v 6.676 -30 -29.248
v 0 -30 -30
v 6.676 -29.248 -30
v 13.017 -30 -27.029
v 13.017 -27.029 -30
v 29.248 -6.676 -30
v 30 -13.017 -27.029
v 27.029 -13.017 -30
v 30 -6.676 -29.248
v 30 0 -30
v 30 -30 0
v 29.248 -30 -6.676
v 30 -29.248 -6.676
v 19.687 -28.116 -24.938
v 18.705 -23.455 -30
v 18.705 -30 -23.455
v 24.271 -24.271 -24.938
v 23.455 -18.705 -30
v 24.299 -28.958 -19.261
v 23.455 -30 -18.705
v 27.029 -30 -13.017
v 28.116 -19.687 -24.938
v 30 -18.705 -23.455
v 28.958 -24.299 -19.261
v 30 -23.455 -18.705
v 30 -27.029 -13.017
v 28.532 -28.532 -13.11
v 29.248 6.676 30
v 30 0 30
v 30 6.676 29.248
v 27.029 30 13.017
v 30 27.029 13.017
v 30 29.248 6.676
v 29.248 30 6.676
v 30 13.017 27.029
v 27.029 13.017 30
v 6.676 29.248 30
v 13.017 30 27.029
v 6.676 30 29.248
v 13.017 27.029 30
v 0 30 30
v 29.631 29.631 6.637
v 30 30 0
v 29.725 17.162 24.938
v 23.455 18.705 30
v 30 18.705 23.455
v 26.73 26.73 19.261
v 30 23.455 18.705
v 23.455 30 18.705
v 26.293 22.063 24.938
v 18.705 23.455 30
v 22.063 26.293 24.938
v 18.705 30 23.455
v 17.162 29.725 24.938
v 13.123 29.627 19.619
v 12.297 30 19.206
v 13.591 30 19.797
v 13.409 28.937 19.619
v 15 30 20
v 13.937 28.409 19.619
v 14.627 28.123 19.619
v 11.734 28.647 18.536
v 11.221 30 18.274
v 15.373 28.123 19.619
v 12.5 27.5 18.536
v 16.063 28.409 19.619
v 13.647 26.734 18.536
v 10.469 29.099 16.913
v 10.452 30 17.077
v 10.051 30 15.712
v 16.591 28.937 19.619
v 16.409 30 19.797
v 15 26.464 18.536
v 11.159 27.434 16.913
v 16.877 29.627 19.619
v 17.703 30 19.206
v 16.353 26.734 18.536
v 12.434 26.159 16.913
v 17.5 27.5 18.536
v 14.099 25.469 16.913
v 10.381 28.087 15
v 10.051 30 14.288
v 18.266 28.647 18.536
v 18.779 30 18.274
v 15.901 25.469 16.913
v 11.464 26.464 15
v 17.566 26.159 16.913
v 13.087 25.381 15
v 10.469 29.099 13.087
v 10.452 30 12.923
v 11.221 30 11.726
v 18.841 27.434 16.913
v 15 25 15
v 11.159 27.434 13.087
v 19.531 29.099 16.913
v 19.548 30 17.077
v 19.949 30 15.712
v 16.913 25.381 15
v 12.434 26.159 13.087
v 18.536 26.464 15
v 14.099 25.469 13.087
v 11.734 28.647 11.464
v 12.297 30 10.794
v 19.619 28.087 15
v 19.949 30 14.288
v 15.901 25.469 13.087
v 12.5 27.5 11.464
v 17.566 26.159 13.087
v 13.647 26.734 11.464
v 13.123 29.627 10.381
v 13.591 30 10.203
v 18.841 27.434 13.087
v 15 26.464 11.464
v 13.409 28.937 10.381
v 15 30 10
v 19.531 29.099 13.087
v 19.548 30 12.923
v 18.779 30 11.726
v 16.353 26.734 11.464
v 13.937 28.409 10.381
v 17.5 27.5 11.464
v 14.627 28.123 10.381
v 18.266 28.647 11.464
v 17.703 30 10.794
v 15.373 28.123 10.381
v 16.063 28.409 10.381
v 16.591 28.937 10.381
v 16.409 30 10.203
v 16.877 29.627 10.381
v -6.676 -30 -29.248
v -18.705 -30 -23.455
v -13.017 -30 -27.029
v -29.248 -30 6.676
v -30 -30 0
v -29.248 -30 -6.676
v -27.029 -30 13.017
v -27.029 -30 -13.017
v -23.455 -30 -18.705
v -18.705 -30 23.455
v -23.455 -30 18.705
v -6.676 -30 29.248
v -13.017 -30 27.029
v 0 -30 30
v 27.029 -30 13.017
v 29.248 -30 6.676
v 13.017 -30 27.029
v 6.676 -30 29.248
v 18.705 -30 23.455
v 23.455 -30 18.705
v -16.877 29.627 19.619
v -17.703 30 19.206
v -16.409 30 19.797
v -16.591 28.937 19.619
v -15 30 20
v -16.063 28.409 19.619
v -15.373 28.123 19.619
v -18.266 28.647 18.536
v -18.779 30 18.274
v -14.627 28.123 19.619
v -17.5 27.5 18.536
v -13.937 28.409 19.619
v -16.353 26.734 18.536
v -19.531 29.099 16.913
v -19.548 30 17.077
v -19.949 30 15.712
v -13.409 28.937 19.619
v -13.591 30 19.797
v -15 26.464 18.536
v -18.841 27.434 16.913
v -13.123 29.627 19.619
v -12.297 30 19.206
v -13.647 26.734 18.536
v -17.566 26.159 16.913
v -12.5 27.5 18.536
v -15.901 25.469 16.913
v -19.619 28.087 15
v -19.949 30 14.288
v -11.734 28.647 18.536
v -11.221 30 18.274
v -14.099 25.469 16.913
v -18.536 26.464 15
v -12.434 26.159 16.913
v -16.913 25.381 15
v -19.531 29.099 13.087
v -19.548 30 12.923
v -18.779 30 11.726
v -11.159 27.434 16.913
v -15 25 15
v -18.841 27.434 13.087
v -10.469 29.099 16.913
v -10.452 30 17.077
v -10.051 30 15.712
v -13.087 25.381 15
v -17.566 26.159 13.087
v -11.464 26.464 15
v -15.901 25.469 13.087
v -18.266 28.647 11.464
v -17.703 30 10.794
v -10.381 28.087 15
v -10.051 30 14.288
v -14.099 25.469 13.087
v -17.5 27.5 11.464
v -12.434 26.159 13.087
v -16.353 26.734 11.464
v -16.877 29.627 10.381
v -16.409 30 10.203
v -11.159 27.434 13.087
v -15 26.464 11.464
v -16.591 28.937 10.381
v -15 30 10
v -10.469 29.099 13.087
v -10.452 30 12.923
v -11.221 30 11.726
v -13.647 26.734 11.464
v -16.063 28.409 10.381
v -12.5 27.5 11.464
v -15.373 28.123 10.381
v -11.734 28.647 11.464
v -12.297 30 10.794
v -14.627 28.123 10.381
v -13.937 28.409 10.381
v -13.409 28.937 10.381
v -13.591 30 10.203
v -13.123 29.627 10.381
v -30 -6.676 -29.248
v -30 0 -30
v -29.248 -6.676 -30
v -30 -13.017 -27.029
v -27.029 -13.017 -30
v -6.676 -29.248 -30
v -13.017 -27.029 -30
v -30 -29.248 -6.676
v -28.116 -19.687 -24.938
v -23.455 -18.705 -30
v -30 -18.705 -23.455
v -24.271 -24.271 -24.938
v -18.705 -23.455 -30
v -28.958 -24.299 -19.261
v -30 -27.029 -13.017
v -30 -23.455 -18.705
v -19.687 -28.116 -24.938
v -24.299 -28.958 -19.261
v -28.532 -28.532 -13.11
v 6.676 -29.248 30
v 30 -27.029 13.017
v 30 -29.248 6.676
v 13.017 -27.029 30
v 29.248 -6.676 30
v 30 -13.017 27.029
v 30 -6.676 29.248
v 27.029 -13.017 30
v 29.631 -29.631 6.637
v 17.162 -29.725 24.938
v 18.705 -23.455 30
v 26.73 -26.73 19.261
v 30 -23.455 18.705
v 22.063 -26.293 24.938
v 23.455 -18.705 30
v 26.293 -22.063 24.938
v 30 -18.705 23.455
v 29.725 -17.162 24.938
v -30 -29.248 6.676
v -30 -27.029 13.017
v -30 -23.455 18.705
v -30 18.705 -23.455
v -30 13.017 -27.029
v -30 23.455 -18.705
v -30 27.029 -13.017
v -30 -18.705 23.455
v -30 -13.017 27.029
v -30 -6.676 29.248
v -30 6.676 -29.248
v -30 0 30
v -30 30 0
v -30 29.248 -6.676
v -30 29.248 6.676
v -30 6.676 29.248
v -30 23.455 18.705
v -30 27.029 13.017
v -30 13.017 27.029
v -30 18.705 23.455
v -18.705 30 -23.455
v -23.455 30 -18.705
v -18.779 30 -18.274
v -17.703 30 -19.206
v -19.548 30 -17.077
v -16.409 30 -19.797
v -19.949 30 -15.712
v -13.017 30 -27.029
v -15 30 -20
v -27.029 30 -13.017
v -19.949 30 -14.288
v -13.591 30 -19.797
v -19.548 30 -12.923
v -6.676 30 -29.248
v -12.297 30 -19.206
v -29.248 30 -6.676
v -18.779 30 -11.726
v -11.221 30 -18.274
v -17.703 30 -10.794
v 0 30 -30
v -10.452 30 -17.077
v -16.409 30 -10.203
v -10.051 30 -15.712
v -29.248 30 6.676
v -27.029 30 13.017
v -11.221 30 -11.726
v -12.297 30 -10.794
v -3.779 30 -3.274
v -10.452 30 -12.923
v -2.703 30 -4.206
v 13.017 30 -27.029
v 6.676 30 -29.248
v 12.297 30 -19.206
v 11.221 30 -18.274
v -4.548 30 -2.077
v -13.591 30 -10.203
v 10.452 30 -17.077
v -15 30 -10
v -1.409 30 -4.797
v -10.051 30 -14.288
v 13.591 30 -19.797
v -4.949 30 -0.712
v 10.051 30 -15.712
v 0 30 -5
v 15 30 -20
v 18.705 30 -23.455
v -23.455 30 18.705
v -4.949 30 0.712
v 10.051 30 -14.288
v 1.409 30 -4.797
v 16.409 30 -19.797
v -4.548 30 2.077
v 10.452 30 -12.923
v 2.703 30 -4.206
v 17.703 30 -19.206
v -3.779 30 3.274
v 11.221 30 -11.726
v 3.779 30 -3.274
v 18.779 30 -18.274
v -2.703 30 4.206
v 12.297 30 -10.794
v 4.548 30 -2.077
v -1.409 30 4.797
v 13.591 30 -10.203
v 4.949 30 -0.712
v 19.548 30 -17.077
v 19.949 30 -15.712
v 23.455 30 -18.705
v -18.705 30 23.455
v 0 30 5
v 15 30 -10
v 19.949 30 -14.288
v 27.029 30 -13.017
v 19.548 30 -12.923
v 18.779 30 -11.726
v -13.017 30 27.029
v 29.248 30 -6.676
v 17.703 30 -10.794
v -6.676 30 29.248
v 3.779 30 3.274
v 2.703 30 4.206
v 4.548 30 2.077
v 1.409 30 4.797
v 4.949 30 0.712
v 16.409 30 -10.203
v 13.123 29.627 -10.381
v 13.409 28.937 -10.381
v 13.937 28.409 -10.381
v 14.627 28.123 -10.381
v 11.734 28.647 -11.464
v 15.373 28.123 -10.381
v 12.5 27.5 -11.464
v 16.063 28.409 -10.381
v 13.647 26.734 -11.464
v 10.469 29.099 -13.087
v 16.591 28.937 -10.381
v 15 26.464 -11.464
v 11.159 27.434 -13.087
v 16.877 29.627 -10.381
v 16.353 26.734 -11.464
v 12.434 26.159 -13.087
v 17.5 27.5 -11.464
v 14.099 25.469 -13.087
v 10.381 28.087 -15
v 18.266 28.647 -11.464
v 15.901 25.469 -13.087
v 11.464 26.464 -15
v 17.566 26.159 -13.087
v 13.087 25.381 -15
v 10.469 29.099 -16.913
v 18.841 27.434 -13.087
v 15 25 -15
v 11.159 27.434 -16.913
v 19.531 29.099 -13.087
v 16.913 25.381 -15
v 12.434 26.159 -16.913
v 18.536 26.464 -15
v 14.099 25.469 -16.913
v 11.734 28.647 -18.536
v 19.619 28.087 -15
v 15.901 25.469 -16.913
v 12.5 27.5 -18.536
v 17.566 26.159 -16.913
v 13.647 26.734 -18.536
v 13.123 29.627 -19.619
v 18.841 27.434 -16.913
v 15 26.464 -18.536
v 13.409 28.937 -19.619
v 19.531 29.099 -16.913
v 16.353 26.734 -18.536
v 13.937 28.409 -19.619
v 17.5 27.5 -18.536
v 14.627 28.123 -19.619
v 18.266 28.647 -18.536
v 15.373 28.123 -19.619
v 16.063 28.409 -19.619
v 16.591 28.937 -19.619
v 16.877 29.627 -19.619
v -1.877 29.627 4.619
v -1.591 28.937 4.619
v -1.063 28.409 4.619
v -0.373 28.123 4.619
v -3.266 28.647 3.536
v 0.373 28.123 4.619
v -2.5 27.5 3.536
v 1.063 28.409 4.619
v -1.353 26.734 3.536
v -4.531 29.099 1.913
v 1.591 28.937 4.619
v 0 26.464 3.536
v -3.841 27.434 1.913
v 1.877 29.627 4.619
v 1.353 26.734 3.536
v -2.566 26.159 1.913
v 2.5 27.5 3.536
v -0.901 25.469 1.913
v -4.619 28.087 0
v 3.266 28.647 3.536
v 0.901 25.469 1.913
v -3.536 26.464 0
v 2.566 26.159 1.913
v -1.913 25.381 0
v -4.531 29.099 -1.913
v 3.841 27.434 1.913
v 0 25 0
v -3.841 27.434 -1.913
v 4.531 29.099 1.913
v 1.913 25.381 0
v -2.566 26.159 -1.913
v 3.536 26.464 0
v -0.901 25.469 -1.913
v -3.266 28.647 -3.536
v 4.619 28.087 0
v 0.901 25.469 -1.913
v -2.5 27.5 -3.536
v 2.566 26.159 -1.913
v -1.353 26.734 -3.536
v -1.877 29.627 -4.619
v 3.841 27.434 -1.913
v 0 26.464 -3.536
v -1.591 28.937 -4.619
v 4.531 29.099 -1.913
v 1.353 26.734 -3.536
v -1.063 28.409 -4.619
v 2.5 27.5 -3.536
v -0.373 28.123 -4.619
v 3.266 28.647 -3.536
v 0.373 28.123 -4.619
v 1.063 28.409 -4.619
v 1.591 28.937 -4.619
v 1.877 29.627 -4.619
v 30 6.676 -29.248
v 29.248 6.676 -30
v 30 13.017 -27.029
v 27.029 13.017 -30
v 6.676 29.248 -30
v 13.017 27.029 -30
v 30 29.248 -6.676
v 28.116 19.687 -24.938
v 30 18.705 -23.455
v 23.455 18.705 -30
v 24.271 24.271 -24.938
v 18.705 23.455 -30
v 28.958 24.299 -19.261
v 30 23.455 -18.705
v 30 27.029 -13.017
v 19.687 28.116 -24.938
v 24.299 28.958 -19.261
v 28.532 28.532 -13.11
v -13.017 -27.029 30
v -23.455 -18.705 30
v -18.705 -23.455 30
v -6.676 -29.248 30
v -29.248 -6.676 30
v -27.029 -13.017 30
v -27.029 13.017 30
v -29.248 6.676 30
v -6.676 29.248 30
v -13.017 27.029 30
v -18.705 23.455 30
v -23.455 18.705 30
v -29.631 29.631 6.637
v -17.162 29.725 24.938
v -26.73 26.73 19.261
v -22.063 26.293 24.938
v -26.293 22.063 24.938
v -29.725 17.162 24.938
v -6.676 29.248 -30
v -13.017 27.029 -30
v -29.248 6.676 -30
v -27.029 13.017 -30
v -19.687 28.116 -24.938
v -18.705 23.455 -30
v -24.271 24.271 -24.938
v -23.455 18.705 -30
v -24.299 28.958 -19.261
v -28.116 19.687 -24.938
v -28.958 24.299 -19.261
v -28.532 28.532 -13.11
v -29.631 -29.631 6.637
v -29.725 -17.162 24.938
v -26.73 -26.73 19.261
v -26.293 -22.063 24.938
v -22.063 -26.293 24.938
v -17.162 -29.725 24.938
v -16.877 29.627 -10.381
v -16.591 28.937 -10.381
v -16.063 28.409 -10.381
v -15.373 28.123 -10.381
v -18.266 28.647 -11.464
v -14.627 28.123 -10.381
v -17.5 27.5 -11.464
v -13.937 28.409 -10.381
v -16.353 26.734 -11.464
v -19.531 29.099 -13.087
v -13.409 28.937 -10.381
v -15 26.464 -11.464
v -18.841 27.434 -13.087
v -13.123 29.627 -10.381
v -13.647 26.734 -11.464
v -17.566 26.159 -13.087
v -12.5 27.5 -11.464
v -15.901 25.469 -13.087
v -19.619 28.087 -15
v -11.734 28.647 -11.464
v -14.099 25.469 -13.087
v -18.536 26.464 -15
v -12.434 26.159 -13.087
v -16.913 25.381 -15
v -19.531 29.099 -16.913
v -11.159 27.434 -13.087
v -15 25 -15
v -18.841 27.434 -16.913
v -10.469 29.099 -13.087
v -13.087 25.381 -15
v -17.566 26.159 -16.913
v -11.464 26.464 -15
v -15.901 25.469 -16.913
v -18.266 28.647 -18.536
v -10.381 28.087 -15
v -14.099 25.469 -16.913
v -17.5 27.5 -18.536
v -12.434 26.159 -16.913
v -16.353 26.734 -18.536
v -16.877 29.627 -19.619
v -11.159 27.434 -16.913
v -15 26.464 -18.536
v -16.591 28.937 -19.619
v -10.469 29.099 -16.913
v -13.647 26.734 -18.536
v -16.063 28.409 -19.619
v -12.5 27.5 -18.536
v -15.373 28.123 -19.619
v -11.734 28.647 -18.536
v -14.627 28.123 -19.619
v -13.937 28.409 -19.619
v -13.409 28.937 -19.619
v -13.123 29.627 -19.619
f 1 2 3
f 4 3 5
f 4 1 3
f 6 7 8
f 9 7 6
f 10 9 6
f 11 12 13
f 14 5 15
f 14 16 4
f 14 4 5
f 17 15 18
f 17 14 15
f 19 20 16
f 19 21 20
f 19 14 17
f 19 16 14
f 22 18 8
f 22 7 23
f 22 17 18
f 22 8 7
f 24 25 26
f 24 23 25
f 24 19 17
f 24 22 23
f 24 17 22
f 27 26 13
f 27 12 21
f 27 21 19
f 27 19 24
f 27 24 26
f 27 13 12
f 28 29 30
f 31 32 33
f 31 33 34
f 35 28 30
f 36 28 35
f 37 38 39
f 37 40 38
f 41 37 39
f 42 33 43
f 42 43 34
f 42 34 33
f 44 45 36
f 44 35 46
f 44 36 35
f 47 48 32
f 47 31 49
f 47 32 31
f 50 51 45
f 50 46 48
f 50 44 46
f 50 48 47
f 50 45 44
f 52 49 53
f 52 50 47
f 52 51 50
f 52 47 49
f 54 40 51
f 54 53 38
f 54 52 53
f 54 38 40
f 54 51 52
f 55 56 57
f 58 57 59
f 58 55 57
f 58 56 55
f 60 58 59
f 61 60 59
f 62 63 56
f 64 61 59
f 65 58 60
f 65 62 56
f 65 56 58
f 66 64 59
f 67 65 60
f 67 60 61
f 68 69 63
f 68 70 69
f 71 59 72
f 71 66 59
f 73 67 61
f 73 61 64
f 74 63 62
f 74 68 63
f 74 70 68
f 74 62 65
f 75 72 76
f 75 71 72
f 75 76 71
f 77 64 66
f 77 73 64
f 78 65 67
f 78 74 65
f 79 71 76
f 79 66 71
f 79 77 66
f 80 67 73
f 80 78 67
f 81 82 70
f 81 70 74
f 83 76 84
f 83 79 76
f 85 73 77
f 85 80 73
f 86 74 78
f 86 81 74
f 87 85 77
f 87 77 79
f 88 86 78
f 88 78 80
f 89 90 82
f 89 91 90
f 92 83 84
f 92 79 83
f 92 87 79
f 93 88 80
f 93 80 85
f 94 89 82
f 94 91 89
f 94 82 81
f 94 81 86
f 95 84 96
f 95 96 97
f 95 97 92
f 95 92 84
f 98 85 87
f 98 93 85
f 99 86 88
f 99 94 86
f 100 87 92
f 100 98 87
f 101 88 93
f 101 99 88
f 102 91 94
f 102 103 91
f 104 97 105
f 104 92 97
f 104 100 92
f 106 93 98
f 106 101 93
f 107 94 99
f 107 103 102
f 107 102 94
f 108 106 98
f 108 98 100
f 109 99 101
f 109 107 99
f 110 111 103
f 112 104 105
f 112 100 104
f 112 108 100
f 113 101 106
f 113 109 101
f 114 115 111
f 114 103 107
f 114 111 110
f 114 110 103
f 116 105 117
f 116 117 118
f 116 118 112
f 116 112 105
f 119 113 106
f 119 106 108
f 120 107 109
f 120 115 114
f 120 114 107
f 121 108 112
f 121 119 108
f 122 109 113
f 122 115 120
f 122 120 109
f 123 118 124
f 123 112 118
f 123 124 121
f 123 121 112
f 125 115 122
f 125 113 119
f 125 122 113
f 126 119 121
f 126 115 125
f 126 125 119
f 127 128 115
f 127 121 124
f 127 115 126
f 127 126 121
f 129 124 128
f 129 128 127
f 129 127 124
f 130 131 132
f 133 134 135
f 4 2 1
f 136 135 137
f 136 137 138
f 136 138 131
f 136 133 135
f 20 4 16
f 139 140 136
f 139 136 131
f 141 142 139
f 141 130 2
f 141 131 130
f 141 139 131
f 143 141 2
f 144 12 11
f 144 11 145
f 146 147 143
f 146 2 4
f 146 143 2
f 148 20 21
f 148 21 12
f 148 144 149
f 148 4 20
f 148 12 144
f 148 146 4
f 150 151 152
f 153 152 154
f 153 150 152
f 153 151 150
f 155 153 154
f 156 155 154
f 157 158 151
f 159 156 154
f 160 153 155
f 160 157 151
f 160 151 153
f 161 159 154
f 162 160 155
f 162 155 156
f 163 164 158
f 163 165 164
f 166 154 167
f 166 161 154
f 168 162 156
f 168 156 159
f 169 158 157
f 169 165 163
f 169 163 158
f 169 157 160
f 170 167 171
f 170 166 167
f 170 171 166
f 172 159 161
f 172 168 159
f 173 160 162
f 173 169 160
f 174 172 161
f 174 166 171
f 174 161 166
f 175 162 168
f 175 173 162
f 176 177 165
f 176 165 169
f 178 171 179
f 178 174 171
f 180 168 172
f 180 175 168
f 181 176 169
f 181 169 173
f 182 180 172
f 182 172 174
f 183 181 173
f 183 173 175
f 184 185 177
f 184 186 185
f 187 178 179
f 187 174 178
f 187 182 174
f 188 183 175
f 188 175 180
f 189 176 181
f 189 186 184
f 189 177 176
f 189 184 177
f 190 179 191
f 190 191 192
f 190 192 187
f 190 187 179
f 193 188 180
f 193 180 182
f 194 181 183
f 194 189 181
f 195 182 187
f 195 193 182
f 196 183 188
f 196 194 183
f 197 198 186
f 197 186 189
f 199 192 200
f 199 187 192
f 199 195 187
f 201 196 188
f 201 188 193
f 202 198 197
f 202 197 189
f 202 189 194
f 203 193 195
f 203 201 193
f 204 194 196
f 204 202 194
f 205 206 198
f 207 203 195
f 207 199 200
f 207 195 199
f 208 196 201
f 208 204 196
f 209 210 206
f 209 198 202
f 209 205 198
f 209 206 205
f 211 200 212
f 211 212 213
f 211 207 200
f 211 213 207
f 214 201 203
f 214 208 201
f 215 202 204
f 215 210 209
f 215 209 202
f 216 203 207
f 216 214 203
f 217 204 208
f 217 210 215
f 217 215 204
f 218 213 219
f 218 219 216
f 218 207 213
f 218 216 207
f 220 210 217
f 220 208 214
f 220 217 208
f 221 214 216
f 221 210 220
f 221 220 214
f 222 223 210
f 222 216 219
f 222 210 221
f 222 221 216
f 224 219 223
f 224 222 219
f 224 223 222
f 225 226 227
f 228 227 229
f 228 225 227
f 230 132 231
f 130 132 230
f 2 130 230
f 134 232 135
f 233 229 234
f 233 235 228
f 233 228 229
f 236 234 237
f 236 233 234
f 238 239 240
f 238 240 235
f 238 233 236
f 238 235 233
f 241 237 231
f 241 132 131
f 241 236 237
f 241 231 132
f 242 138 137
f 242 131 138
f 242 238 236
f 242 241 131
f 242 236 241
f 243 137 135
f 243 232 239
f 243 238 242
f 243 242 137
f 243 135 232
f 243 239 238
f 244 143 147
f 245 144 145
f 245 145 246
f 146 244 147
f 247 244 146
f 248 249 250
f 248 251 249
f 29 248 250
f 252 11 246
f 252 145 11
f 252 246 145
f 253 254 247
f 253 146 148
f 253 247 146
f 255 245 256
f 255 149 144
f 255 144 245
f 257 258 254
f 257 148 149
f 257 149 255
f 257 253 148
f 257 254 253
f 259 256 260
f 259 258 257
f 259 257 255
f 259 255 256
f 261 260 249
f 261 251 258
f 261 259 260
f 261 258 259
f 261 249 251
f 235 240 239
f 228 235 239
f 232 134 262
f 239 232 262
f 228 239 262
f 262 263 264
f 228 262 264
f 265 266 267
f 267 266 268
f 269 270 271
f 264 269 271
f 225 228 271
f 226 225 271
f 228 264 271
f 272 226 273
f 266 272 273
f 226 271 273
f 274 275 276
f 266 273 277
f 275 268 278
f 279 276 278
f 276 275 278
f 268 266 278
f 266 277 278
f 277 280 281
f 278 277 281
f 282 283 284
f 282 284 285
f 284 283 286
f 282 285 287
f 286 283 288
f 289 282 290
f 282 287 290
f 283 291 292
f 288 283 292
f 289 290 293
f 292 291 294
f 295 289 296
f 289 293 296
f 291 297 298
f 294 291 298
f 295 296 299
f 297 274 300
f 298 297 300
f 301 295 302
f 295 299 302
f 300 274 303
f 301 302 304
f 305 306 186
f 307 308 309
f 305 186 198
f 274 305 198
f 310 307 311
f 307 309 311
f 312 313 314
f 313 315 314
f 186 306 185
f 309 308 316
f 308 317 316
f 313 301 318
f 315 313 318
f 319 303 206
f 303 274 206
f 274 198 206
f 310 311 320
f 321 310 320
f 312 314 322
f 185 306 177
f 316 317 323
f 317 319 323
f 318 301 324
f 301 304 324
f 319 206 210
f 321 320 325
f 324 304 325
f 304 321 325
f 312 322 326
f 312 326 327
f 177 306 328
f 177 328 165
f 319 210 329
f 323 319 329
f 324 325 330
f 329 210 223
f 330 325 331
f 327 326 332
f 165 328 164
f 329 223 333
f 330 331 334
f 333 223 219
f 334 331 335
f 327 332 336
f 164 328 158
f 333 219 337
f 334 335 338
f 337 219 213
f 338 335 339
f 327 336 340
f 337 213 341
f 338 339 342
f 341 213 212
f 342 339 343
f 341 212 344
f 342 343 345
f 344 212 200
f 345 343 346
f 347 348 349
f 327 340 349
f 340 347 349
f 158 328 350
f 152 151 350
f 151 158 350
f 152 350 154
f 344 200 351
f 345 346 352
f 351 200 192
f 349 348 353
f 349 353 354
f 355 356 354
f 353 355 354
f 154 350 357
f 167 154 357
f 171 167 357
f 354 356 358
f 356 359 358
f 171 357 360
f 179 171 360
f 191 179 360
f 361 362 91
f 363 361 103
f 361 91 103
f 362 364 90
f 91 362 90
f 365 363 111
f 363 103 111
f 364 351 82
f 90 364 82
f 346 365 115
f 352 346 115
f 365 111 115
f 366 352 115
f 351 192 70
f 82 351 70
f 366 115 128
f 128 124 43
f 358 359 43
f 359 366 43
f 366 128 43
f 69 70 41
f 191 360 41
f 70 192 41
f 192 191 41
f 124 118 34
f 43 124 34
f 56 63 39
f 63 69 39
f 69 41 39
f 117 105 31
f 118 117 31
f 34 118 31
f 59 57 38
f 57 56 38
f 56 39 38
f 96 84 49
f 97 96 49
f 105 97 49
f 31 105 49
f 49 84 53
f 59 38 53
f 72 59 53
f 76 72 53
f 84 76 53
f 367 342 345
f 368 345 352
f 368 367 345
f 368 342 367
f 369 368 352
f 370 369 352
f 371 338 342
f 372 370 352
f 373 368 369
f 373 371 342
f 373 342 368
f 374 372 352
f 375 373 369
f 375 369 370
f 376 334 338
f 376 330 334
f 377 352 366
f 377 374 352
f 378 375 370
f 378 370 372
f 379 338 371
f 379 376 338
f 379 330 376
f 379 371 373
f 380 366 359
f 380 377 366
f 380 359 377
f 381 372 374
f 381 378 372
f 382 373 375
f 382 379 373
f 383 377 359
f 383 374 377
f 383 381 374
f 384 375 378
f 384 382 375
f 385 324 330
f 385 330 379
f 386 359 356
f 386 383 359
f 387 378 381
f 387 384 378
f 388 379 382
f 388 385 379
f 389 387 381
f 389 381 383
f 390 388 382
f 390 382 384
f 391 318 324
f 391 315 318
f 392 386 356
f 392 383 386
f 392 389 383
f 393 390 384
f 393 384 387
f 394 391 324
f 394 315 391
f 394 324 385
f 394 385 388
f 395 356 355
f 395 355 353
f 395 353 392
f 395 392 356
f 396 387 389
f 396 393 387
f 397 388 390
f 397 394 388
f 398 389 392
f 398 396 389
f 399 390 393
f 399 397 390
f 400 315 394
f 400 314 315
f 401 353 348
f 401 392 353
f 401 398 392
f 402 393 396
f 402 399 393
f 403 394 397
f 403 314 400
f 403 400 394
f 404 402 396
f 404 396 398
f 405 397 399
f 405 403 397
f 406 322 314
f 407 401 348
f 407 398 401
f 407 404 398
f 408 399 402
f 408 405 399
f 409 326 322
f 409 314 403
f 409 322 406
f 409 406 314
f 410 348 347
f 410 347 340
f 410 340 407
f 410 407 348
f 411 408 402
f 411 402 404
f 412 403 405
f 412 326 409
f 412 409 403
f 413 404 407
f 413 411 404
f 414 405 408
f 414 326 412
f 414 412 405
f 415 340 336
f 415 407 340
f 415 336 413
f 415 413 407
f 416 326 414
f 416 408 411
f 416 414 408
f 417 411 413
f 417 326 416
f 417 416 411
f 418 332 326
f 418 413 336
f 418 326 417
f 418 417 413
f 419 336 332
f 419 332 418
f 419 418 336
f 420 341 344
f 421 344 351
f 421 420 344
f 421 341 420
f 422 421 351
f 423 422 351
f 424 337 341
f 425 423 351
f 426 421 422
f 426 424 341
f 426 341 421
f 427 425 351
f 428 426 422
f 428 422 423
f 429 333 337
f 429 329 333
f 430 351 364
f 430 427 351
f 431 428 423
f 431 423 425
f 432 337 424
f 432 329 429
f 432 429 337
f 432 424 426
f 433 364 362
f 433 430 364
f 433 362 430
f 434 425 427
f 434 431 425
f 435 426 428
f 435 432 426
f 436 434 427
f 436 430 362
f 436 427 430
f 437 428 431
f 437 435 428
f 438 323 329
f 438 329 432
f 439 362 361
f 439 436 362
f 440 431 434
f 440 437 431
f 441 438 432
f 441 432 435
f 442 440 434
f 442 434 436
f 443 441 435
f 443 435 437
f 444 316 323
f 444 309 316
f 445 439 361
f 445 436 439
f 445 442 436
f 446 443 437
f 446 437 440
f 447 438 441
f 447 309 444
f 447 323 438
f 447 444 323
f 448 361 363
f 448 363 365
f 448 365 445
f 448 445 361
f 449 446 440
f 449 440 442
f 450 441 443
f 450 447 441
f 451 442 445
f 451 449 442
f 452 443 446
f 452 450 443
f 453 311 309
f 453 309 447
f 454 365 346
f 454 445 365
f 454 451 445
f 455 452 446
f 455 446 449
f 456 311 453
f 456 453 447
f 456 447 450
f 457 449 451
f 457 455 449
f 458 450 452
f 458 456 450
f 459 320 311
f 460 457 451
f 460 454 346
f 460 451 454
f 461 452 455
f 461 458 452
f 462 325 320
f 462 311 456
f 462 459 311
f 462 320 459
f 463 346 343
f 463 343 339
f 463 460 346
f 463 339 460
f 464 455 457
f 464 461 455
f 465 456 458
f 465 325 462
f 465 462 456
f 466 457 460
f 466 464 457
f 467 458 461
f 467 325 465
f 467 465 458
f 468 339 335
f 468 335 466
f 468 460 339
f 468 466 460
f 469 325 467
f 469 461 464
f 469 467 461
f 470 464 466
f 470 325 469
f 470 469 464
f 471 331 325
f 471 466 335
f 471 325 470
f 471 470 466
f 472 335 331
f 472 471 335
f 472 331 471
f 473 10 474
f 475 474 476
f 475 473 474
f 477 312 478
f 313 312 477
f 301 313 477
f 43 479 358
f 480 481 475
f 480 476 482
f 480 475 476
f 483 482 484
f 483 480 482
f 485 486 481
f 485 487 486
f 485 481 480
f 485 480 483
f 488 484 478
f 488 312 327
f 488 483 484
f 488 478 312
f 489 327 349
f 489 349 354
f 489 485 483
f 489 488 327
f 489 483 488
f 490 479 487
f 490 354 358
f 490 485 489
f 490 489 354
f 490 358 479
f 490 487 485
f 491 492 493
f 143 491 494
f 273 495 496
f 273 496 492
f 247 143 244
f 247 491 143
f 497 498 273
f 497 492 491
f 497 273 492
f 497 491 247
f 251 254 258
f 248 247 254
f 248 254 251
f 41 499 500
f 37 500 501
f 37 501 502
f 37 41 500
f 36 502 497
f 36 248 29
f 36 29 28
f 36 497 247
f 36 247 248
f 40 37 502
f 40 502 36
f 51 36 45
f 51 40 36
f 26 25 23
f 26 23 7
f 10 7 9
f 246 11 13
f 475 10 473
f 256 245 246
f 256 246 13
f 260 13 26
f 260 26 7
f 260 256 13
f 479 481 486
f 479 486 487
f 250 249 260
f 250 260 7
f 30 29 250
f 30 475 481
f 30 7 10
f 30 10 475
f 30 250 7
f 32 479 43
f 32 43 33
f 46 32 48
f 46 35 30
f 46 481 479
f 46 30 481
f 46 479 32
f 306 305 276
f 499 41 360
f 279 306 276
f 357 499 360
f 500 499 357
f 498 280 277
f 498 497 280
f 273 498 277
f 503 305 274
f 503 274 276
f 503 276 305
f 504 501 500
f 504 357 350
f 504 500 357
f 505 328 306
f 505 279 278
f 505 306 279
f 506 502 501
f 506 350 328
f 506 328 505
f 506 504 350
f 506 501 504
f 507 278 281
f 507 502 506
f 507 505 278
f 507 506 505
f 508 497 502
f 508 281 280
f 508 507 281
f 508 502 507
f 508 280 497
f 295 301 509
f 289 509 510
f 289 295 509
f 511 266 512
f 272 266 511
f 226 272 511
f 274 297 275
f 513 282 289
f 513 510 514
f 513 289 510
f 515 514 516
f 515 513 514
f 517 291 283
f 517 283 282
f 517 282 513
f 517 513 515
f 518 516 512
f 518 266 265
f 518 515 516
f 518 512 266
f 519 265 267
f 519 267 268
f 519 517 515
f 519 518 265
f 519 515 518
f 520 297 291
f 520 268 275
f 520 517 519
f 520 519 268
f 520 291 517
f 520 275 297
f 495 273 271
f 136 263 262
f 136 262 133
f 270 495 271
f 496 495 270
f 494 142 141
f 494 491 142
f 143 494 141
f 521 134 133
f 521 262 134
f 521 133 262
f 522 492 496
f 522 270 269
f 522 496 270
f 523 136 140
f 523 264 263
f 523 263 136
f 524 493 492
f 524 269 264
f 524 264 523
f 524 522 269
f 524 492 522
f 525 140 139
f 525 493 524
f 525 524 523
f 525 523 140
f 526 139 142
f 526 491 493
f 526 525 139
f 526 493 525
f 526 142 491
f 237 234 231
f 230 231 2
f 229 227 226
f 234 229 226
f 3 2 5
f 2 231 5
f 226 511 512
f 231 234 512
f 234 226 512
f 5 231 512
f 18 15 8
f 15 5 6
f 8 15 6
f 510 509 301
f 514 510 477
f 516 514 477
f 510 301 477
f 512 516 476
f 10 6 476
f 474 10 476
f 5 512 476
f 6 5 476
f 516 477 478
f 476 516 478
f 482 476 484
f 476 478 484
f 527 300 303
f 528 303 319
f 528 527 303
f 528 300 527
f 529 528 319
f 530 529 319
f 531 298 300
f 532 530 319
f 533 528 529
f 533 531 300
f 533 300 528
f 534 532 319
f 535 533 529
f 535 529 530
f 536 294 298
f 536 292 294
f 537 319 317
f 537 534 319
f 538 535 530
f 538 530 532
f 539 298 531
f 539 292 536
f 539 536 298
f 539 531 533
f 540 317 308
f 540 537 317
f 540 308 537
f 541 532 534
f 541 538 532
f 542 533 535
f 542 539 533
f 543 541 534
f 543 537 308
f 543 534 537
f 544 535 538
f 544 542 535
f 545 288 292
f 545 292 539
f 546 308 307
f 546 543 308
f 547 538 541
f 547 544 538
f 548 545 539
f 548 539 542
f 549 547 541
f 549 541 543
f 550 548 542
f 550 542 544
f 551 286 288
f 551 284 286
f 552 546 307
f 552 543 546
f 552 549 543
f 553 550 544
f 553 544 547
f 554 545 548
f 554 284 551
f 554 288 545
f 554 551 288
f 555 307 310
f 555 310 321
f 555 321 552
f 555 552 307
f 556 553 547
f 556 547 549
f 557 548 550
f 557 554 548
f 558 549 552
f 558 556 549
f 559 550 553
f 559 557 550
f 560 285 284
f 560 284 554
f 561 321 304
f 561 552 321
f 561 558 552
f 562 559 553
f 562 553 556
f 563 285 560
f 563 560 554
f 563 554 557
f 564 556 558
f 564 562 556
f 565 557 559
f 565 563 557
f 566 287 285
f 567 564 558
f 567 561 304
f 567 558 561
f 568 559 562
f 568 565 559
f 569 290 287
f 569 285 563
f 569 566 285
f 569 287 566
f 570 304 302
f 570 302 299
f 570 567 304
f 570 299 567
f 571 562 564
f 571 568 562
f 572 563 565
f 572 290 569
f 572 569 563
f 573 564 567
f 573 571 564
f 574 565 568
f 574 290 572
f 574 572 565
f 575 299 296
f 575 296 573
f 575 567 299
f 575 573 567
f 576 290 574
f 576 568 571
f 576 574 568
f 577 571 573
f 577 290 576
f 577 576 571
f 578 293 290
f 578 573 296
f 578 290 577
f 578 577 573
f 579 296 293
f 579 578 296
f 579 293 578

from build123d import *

# Parameters (mm, degrees)
SKETCH1_W            = 60
SKETCH1_H            = 60
BOSS_EXTRUDE1_DEPTH  = 30
LPATTERN2_COUNT      = 3
LPATTERN2_PITCH      = 15
LPATTERN2_COUNT_DIR2 = 3
LPATTERN2_PITCH_DIR2 = 15


with BuildPart() as part:
    # Sketch1 → Boss-Extrude1 (new body, symmetric)
    with BuildSketch(Plane.XY):
        Rectangle(SKETCH1_W, SKETCH1_H)
    extrude(amount=BOSS_EXTRUDE1_DEPTH, both=True)

    # Sketch3 → Cut-Revolve1 (revolve, cut)
    with BuildSketch(Plane(origin=(0, 0, 0), x_dir=(1, 0, 0), z_dir=(0, 1, 0))):
        with BuildLine():
            Line((0, -50), (62, -50))
            Line((62, -50), (62, 50))
            Line((62, 50), (0, 50))
            Line((0, 50), (0, 42.426406871))
            ThreePointArc((0, 42.426406871), (42.426406871, 0), (0, -42.426406871))
            Line((0, -42.426406871), (0, -50))
        make_face()
    revolve(axis=Axis((0, 0, -60.912631334), (0, 0, 1)), mode=Mode.SUBTRACT)

    # Sketch4 → Cut-Revolve2 (revolve, cut)
    with BuildSketch(Plane(origin=(0, 30, 0), x_dir=(1, 0, 0), z_dir=(0, 1, 0))):
        with BuildLine():
            Line((-15, -10), (-15, -20))
            ThreePointArc((-15, -20), (-10, -15), (-15, -10))
        make_face()
    cut_revolve2 = revolve(axis=Axis((-15, 30, 10), (0, 0, 1)), mode=Mode.SUBTRACT)

    # LPattern2: Cut-Revolve2 3 × 3, 4 skipped
    with Locations(*[(j * LPATTERN2_PITCH_DIR2, 0, -i * LPATTERN2_PITCH) for i in range(LPATTERN2_COUNT) for j in range(LPATTERN2_COUNT_DIR2) if (i, j) not in ((0, 0), (0, 1), (1, 0), (1, 2), (2, 1))]):
        add(cut_revolve2, mode=Mode.SUBTRACT)


solid = part.part
